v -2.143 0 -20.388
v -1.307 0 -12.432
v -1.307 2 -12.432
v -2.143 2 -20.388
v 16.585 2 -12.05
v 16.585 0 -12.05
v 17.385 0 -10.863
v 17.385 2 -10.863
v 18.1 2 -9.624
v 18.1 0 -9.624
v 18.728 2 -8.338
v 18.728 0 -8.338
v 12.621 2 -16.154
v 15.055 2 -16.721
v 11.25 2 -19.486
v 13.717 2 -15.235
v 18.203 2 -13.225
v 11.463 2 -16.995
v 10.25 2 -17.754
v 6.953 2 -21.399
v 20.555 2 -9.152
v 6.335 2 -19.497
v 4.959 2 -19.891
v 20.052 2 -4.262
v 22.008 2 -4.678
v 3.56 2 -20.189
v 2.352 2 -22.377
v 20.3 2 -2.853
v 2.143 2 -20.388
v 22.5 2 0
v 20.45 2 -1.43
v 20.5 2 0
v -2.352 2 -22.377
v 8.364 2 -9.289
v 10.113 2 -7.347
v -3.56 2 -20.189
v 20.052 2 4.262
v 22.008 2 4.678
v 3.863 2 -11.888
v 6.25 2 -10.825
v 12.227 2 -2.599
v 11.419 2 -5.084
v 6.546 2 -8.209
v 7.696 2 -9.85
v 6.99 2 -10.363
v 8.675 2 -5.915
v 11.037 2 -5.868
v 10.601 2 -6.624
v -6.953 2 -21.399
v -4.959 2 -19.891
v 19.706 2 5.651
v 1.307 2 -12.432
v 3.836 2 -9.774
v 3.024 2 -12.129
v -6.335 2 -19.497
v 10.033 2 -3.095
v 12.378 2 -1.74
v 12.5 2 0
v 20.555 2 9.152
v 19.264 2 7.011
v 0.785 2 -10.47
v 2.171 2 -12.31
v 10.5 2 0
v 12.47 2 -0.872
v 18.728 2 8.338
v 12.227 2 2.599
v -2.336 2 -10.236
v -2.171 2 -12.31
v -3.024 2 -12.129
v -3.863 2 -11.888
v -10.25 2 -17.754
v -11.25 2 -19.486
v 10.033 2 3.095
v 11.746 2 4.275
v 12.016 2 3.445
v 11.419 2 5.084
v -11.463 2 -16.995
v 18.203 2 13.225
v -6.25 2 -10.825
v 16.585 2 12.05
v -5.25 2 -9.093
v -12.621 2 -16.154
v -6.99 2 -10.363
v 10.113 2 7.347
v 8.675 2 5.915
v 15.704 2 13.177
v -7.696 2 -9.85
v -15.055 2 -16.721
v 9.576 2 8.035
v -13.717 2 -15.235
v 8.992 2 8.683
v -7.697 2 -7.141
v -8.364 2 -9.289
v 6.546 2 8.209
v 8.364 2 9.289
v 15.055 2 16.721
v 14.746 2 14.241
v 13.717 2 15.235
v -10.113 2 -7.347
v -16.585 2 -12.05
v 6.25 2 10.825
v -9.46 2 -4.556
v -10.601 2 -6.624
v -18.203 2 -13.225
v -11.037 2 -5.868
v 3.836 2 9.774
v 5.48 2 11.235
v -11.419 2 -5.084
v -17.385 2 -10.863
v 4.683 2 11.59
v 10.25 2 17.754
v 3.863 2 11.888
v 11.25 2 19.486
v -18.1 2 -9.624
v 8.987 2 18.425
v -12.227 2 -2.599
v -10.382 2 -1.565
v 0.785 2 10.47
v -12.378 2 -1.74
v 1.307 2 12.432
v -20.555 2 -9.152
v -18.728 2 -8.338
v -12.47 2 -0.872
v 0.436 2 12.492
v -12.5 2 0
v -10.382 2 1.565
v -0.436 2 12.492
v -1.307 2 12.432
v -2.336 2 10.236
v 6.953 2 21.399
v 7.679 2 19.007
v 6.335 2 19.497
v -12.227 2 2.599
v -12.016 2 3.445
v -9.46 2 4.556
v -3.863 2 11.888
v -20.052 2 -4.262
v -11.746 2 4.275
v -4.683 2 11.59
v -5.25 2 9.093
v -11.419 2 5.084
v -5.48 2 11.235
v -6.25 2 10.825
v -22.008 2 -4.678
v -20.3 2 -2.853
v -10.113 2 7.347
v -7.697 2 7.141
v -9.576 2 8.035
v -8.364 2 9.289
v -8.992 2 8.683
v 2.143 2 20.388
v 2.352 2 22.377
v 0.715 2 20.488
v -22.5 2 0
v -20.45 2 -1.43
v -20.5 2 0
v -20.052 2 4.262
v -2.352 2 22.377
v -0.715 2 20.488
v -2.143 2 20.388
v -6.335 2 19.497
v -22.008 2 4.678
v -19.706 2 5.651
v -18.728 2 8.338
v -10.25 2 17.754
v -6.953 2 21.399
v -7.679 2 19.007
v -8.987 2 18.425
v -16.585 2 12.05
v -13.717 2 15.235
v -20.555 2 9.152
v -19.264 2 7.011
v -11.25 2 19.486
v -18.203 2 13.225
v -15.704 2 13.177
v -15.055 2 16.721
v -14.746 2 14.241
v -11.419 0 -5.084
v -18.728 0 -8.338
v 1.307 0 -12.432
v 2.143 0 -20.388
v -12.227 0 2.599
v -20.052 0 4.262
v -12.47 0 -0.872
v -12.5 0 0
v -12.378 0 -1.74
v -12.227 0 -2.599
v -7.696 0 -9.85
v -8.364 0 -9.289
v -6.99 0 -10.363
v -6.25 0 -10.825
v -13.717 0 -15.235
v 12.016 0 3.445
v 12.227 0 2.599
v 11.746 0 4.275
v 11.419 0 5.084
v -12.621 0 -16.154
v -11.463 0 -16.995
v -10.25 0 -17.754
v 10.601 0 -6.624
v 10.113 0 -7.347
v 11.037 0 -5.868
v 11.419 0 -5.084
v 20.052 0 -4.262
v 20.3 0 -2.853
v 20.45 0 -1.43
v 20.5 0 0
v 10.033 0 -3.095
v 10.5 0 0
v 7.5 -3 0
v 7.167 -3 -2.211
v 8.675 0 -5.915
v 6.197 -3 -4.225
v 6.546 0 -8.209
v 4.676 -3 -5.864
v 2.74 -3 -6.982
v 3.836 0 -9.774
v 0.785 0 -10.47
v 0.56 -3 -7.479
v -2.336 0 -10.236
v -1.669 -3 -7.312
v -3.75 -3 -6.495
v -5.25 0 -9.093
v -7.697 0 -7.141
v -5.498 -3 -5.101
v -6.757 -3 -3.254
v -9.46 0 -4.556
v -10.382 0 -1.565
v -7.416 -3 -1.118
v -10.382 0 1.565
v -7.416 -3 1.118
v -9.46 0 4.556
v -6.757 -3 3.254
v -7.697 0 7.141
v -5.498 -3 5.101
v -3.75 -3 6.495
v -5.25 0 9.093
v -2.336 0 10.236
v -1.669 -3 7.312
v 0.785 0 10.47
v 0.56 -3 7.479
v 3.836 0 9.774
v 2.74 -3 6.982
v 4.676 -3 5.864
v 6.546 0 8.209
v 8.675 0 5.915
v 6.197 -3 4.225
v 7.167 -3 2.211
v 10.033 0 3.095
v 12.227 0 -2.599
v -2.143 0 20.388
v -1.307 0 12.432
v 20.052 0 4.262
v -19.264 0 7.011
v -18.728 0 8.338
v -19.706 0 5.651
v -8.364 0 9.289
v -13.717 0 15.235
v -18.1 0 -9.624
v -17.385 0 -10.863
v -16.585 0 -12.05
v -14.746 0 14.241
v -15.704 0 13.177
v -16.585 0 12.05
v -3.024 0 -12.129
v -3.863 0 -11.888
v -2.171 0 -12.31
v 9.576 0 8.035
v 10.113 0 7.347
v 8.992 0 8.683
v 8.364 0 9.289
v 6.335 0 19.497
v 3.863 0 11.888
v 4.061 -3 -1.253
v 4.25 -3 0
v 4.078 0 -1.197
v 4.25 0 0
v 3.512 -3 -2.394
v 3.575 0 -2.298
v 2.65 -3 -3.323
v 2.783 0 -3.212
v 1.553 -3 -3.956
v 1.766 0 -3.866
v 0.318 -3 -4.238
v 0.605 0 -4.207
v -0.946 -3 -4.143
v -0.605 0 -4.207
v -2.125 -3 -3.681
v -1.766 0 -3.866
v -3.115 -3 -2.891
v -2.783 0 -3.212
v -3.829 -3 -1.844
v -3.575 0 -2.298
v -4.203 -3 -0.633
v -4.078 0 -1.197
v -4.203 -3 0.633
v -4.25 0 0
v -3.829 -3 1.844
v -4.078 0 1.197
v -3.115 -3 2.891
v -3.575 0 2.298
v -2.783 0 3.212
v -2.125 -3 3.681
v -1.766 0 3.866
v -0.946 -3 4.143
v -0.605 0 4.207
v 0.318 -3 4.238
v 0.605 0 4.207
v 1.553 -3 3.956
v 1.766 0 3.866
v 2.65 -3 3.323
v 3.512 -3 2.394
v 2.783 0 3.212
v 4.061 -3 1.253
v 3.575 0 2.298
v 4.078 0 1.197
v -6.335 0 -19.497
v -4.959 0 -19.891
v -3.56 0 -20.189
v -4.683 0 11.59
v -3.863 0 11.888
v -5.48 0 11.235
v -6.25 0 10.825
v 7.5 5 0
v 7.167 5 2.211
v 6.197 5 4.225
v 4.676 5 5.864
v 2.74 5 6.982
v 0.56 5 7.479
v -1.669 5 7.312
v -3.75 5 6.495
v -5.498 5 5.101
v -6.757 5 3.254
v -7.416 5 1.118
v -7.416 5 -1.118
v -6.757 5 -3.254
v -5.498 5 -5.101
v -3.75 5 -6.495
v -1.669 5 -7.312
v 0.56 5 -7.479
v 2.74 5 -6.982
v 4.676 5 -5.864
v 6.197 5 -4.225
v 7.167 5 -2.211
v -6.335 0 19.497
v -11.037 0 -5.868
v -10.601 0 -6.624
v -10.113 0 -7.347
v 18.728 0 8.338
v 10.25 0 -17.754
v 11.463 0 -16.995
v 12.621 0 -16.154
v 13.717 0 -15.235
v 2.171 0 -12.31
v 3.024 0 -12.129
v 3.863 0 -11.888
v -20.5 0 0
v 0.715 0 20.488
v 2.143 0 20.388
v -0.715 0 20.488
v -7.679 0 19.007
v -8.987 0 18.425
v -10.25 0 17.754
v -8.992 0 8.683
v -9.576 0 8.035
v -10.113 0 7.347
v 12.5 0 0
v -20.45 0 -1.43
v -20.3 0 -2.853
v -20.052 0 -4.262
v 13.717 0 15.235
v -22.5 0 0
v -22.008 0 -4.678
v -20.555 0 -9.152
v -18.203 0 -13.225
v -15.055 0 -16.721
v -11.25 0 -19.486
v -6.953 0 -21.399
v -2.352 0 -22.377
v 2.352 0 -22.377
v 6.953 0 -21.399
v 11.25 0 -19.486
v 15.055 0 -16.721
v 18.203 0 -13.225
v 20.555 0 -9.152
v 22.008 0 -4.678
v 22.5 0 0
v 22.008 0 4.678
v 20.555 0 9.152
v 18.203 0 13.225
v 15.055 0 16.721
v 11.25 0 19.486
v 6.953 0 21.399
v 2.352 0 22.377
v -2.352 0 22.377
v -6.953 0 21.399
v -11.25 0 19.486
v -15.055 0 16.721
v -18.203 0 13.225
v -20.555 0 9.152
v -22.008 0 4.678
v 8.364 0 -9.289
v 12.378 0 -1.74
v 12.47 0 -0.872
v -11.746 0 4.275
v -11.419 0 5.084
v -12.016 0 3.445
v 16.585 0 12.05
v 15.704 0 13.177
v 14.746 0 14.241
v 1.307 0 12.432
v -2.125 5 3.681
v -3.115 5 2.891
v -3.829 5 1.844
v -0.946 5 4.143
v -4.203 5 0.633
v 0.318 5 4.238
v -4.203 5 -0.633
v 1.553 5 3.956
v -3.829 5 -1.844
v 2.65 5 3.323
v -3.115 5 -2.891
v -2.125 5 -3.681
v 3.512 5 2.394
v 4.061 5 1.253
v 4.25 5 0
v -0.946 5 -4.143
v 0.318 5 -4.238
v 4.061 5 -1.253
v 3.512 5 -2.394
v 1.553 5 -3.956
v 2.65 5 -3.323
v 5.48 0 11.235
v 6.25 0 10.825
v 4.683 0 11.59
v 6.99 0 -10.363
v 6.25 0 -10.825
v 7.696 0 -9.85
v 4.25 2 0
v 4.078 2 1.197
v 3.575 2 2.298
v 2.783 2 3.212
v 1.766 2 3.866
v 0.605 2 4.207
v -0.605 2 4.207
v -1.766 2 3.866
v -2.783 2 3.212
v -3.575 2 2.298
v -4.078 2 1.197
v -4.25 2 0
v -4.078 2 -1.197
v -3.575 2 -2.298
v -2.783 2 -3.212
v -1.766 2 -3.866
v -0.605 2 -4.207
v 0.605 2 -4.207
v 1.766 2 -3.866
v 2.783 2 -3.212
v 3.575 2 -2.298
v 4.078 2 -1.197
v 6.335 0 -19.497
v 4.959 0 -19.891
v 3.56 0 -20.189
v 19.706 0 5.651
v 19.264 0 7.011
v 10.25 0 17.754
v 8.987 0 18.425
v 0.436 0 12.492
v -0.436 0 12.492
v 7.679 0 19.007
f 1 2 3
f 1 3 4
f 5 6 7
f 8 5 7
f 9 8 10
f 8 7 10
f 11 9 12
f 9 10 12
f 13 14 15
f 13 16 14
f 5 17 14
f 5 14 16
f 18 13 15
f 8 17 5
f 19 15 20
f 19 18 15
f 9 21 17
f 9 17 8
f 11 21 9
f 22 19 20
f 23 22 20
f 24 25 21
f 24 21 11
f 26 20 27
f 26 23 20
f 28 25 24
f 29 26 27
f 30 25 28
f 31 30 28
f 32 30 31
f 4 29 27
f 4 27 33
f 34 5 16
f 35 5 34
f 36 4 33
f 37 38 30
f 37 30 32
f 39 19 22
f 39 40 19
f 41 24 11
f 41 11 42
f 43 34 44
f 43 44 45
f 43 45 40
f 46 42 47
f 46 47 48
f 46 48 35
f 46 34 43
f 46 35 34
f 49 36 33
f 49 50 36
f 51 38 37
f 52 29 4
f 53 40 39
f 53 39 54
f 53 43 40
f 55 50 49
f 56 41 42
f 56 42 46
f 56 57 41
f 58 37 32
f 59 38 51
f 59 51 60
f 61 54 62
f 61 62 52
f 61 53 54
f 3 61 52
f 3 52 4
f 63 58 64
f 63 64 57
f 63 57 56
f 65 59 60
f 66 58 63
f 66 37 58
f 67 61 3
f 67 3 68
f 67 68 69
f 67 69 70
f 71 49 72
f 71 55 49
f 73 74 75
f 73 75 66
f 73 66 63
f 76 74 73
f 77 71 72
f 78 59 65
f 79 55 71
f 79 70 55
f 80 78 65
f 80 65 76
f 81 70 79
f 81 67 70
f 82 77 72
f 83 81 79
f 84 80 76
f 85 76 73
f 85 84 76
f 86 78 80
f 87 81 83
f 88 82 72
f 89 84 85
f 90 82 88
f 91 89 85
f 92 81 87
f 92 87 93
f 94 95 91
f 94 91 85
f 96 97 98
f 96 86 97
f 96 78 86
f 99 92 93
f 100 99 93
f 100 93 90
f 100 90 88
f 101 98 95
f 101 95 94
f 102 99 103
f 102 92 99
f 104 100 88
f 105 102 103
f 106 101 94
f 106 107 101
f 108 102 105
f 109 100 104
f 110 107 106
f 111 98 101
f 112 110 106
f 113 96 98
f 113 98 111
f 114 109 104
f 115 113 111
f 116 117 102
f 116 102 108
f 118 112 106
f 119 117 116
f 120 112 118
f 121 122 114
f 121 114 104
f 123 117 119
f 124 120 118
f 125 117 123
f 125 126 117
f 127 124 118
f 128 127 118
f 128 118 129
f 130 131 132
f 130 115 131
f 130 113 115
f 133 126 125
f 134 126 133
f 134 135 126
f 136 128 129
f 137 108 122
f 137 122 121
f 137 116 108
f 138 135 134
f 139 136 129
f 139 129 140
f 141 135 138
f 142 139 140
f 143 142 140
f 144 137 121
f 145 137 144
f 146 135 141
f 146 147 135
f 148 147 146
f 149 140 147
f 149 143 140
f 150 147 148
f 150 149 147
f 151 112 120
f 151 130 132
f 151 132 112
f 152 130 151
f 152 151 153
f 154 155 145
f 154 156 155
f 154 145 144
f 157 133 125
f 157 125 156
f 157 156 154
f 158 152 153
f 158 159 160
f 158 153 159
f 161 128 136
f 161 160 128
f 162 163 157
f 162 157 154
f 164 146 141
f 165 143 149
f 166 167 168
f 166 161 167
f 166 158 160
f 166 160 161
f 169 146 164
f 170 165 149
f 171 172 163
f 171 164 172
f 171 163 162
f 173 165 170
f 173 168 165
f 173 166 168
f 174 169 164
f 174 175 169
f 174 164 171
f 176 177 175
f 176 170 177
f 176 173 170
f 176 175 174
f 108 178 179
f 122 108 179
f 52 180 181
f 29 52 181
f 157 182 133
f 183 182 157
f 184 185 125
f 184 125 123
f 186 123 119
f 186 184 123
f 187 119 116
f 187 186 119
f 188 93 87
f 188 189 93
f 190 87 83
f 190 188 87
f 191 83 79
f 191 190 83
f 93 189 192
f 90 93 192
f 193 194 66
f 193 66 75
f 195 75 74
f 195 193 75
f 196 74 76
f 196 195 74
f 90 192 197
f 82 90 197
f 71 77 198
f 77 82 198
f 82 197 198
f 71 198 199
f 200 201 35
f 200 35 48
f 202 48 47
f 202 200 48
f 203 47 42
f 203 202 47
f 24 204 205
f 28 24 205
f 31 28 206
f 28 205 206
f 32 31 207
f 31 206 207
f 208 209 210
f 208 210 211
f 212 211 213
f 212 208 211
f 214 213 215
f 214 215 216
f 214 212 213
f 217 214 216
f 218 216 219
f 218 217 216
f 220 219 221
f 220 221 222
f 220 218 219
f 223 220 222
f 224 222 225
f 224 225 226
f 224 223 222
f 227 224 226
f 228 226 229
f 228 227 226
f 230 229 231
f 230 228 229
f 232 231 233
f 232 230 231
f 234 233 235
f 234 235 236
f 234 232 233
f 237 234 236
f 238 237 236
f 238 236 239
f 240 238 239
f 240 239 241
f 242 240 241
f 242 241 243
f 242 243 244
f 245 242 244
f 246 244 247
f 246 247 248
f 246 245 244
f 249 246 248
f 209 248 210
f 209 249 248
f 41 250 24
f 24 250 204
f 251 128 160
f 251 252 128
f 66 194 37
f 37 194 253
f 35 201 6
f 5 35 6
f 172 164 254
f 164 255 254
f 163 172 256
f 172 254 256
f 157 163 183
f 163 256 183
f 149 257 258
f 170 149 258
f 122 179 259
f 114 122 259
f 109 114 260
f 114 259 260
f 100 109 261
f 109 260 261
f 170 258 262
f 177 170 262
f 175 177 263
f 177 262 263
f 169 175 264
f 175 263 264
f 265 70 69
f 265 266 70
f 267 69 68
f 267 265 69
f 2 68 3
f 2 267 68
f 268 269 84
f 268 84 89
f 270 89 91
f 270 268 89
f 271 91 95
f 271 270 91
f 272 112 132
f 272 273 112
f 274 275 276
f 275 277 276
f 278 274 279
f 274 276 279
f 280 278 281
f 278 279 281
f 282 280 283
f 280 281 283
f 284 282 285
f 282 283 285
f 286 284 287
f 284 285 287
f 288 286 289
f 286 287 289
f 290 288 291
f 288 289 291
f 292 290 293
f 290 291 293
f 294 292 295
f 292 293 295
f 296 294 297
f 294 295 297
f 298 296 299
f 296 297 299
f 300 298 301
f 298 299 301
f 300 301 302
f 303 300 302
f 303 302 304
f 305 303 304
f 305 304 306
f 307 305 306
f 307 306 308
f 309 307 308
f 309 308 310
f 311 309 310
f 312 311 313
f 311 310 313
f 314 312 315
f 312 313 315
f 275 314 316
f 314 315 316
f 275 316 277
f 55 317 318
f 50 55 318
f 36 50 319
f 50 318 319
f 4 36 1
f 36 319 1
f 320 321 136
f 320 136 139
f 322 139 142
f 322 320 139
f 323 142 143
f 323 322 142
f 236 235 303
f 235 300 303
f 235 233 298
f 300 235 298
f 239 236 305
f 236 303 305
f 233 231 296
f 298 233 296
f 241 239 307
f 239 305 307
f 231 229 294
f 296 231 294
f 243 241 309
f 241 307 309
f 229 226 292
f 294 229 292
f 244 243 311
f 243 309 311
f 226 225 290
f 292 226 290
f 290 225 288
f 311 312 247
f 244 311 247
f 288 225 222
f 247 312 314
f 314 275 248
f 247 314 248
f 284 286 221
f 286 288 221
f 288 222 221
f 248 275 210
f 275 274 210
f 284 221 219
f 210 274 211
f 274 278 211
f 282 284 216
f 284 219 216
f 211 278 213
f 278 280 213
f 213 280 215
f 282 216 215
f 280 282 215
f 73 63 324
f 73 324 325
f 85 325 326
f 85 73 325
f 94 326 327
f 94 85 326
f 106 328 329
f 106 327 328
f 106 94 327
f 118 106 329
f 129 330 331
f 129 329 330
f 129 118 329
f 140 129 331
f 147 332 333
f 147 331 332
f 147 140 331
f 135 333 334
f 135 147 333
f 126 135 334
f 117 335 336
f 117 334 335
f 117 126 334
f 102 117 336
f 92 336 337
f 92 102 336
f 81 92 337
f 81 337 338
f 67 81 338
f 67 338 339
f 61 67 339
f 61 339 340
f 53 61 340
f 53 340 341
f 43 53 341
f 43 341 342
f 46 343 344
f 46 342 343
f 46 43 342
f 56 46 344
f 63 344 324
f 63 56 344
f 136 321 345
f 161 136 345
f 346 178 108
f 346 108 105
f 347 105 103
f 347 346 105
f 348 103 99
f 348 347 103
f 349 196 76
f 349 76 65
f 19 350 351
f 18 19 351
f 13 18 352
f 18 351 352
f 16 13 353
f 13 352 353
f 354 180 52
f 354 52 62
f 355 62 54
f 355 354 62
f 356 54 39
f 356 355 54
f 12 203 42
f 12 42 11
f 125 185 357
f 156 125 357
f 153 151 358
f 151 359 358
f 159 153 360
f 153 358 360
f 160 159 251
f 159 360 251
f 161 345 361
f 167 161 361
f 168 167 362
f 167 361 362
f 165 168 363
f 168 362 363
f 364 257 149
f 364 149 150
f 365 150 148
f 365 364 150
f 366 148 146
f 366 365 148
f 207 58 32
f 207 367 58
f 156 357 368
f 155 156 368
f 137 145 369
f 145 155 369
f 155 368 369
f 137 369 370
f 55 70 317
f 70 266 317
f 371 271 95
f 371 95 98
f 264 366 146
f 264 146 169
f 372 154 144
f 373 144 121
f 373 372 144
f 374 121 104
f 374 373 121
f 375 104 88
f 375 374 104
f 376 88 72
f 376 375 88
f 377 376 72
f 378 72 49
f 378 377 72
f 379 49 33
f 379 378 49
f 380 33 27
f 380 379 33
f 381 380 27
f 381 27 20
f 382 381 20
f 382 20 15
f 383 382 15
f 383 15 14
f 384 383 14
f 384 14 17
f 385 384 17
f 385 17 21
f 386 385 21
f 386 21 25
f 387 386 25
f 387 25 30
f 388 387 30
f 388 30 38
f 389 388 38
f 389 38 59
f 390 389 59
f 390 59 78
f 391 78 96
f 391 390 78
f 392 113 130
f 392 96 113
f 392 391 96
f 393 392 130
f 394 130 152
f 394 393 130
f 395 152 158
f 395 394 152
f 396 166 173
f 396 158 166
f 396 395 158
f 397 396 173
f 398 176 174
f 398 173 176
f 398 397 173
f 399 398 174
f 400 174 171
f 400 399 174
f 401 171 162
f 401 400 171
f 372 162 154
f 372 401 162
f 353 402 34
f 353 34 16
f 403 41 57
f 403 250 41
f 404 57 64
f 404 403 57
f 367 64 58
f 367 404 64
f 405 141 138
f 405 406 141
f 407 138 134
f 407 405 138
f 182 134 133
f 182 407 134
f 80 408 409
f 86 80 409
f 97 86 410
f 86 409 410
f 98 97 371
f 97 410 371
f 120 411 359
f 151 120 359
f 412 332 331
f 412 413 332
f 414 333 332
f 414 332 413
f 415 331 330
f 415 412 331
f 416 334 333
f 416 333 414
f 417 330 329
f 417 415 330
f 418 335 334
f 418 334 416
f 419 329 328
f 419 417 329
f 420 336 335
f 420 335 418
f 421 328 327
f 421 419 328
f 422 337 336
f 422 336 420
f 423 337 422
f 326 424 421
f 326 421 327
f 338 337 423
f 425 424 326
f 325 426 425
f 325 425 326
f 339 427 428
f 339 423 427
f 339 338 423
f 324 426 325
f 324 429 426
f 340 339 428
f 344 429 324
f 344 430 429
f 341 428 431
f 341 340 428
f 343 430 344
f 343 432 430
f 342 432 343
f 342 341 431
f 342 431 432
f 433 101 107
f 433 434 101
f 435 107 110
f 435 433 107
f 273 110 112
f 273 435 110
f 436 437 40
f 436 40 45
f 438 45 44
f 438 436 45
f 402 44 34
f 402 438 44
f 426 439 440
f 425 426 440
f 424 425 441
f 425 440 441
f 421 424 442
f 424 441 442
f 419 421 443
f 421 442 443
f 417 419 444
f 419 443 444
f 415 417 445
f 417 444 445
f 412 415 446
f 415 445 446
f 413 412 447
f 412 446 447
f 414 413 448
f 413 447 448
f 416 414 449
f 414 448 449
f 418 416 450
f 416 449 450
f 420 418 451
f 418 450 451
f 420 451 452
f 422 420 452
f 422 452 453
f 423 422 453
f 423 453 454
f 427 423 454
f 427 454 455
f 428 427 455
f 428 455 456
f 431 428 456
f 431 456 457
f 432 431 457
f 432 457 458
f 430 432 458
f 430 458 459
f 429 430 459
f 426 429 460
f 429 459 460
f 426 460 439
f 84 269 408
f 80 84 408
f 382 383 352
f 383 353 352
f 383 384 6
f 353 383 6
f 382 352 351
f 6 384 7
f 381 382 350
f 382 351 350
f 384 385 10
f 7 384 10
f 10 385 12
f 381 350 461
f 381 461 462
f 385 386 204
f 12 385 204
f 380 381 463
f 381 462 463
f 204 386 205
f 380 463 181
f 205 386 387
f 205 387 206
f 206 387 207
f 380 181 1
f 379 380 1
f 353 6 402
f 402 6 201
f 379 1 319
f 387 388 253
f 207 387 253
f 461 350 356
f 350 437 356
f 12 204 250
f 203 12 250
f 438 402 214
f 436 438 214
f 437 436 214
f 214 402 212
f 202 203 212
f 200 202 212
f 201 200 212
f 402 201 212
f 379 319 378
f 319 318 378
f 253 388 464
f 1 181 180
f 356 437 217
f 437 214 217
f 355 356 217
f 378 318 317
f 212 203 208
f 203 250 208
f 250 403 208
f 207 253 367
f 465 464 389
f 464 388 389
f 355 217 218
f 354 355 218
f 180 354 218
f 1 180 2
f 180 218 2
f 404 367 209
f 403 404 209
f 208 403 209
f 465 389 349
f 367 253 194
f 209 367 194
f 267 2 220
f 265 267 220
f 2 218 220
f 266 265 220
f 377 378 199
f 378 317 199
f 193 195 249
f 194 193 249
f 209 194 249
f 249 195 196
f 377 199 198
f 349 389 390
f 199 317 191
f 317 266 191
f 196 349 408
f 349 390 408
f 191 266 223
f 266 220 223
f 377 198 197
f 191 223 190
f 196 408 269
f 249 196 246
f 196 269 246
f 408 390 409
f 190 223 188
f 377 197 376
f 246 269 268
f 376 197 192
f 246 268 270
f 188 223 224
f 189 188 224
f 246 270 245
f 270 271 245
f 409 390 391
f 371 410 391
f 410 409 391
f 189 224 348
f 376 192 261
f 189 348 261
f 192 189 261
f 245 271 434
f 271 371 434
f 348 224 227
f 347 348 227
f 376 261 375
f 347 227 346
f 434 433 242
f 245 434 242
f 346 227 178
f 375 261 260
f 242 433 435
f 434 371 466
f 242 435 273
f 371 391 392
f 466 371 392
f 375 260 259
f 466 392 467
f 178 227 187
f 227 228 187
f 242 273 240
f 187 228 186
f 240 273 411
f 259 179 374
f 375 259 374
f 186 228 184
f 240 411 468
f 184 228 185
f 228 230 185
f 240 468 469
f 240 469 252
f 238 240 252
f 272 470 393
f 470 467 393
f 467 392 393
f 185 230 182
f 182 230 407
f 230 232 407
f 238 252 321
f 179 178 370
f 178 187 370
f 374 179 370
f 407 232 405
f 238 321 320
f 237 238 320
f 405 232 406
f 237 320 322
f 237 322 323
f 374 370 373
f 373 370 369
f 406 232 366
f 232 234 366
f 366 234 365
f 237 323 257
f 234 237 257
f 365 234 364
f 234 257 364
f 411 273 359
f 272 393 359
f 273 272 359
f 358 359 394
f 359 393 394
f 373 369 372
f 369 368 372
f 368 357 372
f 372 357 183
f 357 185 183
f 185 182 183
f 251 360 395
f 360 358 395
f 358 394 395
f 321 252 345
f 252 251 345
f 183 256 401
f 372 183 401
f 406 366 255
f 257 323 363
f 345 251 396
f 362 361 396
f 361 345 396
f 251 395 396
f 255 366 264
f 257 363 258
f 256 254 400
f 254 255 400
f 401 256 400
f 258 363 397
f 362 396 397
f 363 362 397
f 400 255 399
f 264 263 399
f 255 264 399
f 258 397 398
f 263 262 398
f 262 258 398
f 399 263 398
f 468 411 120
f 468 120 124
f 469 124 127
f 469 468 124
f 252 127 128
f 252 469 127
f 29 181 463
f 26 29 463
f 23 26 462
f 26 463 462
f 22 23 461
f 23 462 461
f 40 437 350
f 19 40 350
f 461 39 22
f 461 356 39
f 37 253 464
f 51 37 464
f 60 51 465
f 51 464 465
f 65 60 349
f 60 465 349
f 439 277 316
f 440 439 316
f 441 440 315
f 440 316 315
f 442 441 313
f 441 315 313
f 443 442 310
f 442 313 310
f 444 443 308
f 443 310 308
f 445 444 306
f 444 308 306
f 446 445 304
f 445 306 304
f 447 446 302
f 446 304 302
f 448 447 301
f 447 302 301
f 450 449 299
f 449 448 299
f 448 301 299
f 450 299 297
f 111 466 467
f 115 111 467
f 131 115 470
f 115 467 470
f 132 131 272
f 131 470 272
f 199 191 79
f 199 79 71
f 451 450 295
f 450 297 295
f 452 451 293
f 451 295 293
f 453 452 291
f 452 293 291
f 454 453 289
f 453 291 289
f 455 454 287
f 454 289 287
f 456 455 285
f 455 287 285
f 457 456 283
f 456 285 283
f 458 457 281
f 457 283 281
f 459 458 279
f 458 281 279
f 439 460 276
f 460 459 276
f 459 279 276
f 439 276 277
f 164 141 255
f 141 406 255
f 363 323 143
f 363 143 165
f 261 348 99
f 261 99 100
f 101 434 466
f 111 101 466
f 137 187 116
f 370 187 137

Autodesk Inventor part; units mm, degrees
ref_plane "YZ Plane" through (0, 0, 0) normal (1, 0, 0) x (0, 1, 0)
ref_plane "XZ Plane" through (0, 0, 0) normal (0, 1, 0) x (-1, 0, 0)
ref_plane "XY Plane" through (0, 0, 0) normal (0, 0, 1) x (1, 0, 0)
sketch "Sketch1" plane through (0, 0, 0) normal (0, 1, 0) x (-1, 0, 0)
  circle A0 centre (0, 0) radius 12.5
  circle A1 centre (0, 0) radius 22.5
  line L0 (12.5, 0) -> (22.5, 0)
  line L1 (12.2268, 2.5989) -> (22.0083, 4.678)
  line L2 (11.4193, 5.0842) -> (20.5548, 9.1516)
  line L3 (10.1127, 7.3473) -> (18.2029, 13.2252)
  line L4 (8.3641, 9.2893) -> (15.0554, 16.7208)
  line L5 (6.25, 10.8253) -> (11.25, 19.4856)
  line L6 (3.8627, 11.8882) -> (6.9529, 21.3988)
  line L7 (1.3066, 12.4315) -> (2.3519, 22.3767)
  line L8 (-1.3066, 12.4315) -> (-2.3519, 22.3767)
  line L9 (-3.8627, 11.8882) -> (-6.9529, 21.3988)
  line L10 (-6.25, 10.8253) -> (-11.25, 19.4856)
  line L11 (-8.3641, 9.2893) -> (-15.0554, 16.7208)
  line L12 (-10.1127, 7.3473) -> (-18.2029, 13.2252)
  line L13 (-11.4193, 5.0842) -> (-20.5548, 9.1516)
  line L14 (-12.2268, 2.5989) -> (-22.0083, 4.678)
  line L15 (-12.5, 0) -> (-22.5, 0)
  line L16 (-12.2268, -2.5989) -> (-22.0083, -4.678)
  line L17 (-11.4193, -5.0842) -> (-20.5548, -9.1516)
  line L18 (-10.1127, -7.3473) -> (-18.2029, -13.2252)
  line L19 (-8.3641, -9.2893) -> (-15.0554, -16.7208)
  line L20 (-6.25, -10.8253) -> (-11.25, -19.4856)
  line L21 (-3.8627, -11.8882) -> (-6.9529, -21.3988)
  line L22 (-1.3066, -12.4315) -> (-2.3519, -22.3767)
  line L23 (1.3066, -12.4315) -> (2.3519, -22.3767)
  line L24 (3.8627, -11.8882) -> (6.9529, -21.3988)
  line L25 (6.25, -10.8253) -> (11.25, -19.4856)
  line L26 (8.3641, -9.2893) -> (15.0554, -16.7208)
  line L27 (10.1127, -7.3473) -> (18.2029, -13.2252)
  line L28 (11.4193, -5.0842) -> (20.5548, -9.1516)
  line L29 (12.2268, -2.5989) -> (22.0083, -4.678)
  circle A2 centre (0, 0) radius 4.25
  circle A3 centre (0, 0) radius 20.5
  point P0 (18.7277, 8.3381)
  point P1 (20.052, 4.2622)
  point P2 (20.5, 0)
  point P3 (20.052, -4.2622)
  point P4 (18.7277, -8.3381)
  point P5 (16.5848, -12.0496)
  point P6 (13.7172, -15.2345)
  point P7 (10.25, -17.7535)
  point P8 (6.3348, -19.4967)
  point P9 (2.1428, -20.3877)
  point P10 (-2.1428, -20.3877)
  point P11 (-6.3348, -19.4967)
  point P12 (-10.25, -17.7535)
  point P13 (-13.7172, -15.2345)
  point P14 (-16.5848, -12.0496)
  point P15 (-18.7277, -8.3381)
  point P16 (-20.052, -4.2622)
  point P17 (-20.5, 0)
  point P18 (-20.052, 4.2622)
  point P19 (-18.7277, 8.3381)
  point P20 (-16.5848, 12.0496)
  point P21 (-13.7172, 15.2345)
  point P22 (-10.25, 17.7535)
  point P23 (-6.3348, 19.4967)
  point P24 (-2.1428, 20.3877)
  point P25 (2.1428, 20.3877)
  point P26 (6.3348, 19.4967)
  point P27 (10.25, 17.7535)
  point P28 (13.7172, 15.2345)
  point P29 (16.5848, 12.0496)
  dimension "d0" = 45
  dimension "d1" = 10
  dimension "d17" = 2
  dimension "d6" = 360
  dimension "d11" = 8.5
extrude "Extrusion1" add sketch "Sketch1" along normal blind 2 contours A0 | A0 L1 A3 L0 | L29 A3 L28 A0 | A3 L1 A1 L0 | L0 A1 L29 A3 | A0 L3 A3 L2 | A3 L2 A1 L1 | L29 A1 L28 A3 | A3 L3 A1 L2 | L27 A3 L26 A0 | L28 A1 L27 A3 | A0 L5 A3 L4 | A3 L4 A1 L3 | L27 A1 L26 A3 | A3 L5 A1 L4 | L25 A3 L24 A0 | L26 A1 L25 A3 | A0 L7 A3 L6 | A3 L6 A1 L5 | L25 A1 L24 A3 | A3 L7 A1 L6 | L23 A3 L22 A0 | L24 A1 L23 A3 | A0 L9 A3 L8 | A3 L8 A1 L7 | L23 A1 L22 A3 | A3 L9 A1 L8 | L21 A3 L20 A0 | L22 A1 L21 A3 | A0 L11 A3 L10 | A3 L10 A1 L9 | L21 A1 L20 A3 | A3 L11 A1 L10 | L19 A3 L18 A0 | L20 A1 L19 A3 | A0 L13 A3 L12 | A3 L12 A1 L11 | L19 A1 L18 A3 | A3 L13 A1 L12 | L17 A3 L16 A0 | L18 A1 L17 A3 | A0 L15 A3 L14 | A3 L14 A1 L13 | L17 A1 L16 A3 | A3 L15 A1 L14 | L16 A1 L15 A3
sketch "Sketch3" plane through (0, 2, 0) normal (0, 1, 0) x (1, 0, 0)
  circle A0 centre (0, 0) radius 4.25
  circle A1 centre (0, 0) radius 7.5
  circle A2 centre (0, 0) radius 4.25 projected
  dimension "d19" = 15
extrude "Extrusion3" add sketch "Sketch3" along normal blind 3 and the other way blind 5
chamfer "Chamfer2" distance 3 angle 45 2 edges at (-7.5, 2, 0) (-7.5, 0, 0)
properties part number "rotary encoder"
